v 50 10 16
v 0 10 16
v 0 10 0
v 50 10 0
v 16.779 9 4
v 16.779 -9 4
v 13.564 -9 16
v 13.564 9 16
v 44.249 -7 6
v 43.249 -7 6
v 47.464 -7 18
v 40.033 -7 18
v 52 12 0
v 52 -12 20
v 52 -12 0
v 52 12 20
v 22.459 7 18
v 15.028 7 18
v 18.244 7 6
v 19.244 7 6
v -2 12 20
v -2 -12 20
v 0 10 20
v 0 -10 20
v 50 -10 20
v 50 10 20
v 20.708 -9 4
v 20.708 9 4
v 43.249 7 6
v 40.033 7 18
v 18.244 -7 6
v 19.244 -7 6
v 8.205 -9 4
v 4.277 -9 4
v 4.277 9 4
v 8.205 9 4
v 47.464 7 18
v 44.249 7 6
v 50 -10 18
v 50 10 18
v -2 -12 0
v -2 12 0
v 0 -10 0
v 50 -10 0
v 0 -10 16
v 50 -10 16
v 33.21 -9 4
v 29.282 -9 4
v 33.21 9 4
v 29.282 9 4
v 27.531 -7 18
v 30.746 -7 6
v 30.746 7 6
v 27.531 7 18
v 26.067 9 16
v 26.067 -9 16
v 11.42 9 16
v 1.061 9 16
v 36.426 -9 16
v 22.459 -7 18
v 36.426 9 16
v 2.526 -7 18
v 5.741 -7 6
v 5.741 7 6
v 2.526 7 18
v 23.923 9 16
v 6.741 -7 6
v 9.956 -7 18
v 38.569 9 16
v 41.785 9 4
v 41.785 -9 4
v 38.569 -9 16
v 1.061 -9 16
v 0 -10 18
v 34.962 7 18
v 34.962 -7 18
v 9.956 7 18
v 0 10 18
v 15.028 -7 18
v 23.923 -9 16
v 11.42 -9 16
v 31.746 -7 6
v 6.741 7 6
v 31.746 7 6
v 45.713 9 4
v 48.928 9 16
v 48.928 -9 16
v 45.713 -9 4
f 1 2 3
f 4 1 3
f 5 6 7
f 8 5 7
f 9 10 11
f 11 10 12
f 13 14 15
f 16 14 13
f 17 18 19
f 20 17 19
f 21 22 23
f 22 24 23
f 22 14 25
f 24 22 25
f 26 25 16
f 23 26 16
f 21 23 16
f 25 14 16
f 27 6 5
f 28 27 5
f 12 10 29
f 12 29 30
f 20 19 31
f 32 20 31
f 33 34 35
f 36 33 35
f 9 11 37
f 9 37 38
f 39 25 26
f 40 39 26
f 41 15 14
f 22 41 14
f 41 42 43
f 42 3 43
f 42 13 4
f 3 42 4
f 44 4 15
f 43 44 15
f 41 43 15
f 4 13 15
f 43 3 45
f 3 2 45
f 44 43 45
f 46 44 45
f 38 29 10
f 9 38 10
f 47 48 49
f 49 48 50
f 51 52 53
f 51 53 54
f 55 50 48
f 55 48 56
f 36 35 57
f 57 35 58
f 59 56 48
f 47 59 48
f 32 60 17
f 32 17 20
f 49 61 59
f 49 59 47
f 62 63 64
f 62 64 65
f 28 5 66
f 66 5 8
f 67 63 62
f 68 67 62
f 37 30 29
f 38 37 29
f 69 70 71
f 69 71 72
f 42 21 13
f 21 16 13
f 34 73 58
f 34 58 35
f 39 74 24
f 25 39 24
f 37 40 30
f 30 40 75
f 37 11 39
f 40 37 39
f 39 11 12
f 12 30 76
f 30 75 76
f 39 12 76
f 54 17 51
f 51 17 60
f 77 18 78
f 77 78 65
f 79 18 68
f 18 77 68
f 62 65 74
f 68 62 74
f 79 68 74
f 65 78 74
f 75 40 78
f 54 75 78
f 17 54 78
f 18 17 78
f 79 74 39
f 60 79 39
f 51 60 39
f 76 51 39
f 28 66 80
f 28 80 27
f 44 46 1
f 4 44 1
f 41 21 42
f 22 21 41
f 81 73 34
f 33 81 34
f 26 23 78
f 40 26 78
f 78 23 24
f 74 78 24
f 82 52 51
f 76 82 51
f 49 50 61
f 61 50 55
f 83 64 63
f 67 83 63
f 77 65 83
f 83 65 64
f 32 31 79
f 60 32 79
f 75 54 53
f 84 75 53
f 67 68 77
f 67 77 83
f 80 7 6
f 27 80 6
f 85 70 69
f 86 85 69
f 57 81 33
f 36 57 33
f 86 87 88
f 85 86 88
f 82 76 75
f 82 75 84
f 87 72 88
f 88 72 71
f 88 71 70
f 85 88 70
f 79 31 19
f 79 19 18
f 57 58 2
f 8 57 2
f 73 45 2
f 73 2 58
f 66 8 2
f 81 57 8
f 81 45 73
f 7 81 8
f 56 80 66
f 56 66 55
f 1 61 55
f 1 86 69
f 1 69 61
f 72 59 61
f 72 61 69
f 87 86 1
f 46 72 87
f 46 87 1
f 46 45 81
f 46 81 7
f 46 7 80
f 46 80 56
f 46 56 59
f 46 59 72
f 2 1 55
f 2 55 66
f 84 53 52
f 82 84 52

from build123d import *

# Parameters (mm, degrees)
F1_DEPTH = 50
F3_DEPTH = 9
F4_DEPTH = 9
F5_W     = 20
F5_H     = 2
F5_H_2   = 16
F6_DEPTH = 2
F8_DEPTH = 2


# Not quite as in the source:
# - a feature names something its author has since deleted; it is built from what else it names


with BuildPart() as f1:
    # F0 (on Right) → F1 (new body)
    with BuildSketch(Plane.YZ):
        Polygon((10, 18), (7, 18), (7, 6), (0, 6), (-7, 6), (-7, 18), (-10, 18), (-10, 20), (-12, 20), (-12, 0), (-10, 0), (-10, 16), (-9, 16), (-9, 4), (0, 4), (9, 4), (9, 16), (10, 16), (10, 0), (12, 0), (12, 20), (10, 20), align=None)
    extrude(amount=F1_DEPTH)

    # F2 (on Front) → F3 (join, symmetric)
    with BuildSketch(Plane.XZ):
        Polygon((37.4974226119, 16), (38.5692193817, 16), (41.7846096908, 4), (45.7128129211, 4), (48.9282032303, 16), (50, 16), (50, 18), (49.4641016151, 18), (47.4641016151, 18), (44.248711306, 6), (43.248711306, 6), (40.0333209968, 18), (38.0333209968, 18), (37.4974226119, 18), (36.9615242271, 18), (34.9615242271, 18), (31.7461339179, 6), (30.7461339179, 6), (27.5307436087, 18), (25.5307436087, 18), (24.9948452239, 18), (24.458946839, 18), (22.458946839, 18), (19.2435565298, 6), (18.2435565298, 6), (15.0281662206, 18), (13.0281662206, 18), (12.4922678358, 18), (11.9563694509, 18), (9.9563694509, 18), (6.7409791417, 6), (5.7409791417, 6), (2.5255888326, 18), (0.5255888326, 18), (-0.0103095523, 18), (-0.0103095523, 16), (1.0614872174, 16), (4.2768775266, 4), (8.2050807569, 4), (11.4204710661, 16), (12.4922678358, 16), (13.5640646055, 16), (16.7794549147, 4), (20.707658145, 4), (23.9230484541, 16), (24.9948452239, 16), (26.0666419936, 16), (29.2820323028, 4), (33.210235533, 4), (36.4256258422, 16), align=None)
    extrude(amount=F3_DEPTH, both=True)

    # F2 (on Front) → F4 (cut, symmetric)
    with BuildSketch(Plane.XZ):
        Polygon((48.9282032303, 16), (45.7128129211, 4), (50, 4), (50, 16), align=None)
        Polygon((41.7846096908, 4), (38.5692193817, 16), (37.4974226119, 16), (36.4256258422, 16), (33.210235533, 4), (37.4974226119, 4), align=None)
        Polygon((24.9948452239, 4), (29.2820323028, 4), (26.0666419936, 16), (24.9948452239, 16), (23.9230484541, 16), (20.707658145, 4), align=None)
        Polygon((12.4922678358, 4), (16.7794549147, 4), (13.5640646055, 16), (12.4922678358, 16), (11.4204710661, 16), (8.2050807569, 4), align=None)
        Polygon((-0.0103095523, 4), (4.2768775266, 4), (1.0614872174, 16), (-0.0103095523, 16), align=None)
    extrude(amount=F4_DEPTH, both=True, mode=Mode.SUBTRACT)

    # F5 (on face) → F6 (join)
    with BuildSketch(Plane.YZ.offset(50)):
        with Locations((0, 19)):
            Rectangle(F5_W, F5_H)
        Polygon((-10, 20), (-12, 20), (-12, 0), (-10, 0), (-10, 16), (10, 16), (10, 0), (12, 0), (12, 20), (10, 20), (10, 18), (-10, 18), align=None)
        with Locations((0, 8)):
            Rectangle(F5_W, F5_H_2)
    extrude(amount=F6_DEPTH)

    # F7 (on face) → F8 (join)
    with BuildSketch(Plane(origin=(0, 0, 0), x_dir=(0, -1, 0), z_dir=(-1, 0, 0))):
        Polygon((12, 20), (10, 20), (10, 18), (9, 18), (9, 16), (10, 16), (10, 0), (12, 0), align=None)
        Polygon((10, 20), (-12, 20), (-12, 0), (10, 0), (10, 16), (9, 16), (9, 18), (10, 18), align=None)
    extrude(amount=F8_DEPTH)


solid = f1.part
